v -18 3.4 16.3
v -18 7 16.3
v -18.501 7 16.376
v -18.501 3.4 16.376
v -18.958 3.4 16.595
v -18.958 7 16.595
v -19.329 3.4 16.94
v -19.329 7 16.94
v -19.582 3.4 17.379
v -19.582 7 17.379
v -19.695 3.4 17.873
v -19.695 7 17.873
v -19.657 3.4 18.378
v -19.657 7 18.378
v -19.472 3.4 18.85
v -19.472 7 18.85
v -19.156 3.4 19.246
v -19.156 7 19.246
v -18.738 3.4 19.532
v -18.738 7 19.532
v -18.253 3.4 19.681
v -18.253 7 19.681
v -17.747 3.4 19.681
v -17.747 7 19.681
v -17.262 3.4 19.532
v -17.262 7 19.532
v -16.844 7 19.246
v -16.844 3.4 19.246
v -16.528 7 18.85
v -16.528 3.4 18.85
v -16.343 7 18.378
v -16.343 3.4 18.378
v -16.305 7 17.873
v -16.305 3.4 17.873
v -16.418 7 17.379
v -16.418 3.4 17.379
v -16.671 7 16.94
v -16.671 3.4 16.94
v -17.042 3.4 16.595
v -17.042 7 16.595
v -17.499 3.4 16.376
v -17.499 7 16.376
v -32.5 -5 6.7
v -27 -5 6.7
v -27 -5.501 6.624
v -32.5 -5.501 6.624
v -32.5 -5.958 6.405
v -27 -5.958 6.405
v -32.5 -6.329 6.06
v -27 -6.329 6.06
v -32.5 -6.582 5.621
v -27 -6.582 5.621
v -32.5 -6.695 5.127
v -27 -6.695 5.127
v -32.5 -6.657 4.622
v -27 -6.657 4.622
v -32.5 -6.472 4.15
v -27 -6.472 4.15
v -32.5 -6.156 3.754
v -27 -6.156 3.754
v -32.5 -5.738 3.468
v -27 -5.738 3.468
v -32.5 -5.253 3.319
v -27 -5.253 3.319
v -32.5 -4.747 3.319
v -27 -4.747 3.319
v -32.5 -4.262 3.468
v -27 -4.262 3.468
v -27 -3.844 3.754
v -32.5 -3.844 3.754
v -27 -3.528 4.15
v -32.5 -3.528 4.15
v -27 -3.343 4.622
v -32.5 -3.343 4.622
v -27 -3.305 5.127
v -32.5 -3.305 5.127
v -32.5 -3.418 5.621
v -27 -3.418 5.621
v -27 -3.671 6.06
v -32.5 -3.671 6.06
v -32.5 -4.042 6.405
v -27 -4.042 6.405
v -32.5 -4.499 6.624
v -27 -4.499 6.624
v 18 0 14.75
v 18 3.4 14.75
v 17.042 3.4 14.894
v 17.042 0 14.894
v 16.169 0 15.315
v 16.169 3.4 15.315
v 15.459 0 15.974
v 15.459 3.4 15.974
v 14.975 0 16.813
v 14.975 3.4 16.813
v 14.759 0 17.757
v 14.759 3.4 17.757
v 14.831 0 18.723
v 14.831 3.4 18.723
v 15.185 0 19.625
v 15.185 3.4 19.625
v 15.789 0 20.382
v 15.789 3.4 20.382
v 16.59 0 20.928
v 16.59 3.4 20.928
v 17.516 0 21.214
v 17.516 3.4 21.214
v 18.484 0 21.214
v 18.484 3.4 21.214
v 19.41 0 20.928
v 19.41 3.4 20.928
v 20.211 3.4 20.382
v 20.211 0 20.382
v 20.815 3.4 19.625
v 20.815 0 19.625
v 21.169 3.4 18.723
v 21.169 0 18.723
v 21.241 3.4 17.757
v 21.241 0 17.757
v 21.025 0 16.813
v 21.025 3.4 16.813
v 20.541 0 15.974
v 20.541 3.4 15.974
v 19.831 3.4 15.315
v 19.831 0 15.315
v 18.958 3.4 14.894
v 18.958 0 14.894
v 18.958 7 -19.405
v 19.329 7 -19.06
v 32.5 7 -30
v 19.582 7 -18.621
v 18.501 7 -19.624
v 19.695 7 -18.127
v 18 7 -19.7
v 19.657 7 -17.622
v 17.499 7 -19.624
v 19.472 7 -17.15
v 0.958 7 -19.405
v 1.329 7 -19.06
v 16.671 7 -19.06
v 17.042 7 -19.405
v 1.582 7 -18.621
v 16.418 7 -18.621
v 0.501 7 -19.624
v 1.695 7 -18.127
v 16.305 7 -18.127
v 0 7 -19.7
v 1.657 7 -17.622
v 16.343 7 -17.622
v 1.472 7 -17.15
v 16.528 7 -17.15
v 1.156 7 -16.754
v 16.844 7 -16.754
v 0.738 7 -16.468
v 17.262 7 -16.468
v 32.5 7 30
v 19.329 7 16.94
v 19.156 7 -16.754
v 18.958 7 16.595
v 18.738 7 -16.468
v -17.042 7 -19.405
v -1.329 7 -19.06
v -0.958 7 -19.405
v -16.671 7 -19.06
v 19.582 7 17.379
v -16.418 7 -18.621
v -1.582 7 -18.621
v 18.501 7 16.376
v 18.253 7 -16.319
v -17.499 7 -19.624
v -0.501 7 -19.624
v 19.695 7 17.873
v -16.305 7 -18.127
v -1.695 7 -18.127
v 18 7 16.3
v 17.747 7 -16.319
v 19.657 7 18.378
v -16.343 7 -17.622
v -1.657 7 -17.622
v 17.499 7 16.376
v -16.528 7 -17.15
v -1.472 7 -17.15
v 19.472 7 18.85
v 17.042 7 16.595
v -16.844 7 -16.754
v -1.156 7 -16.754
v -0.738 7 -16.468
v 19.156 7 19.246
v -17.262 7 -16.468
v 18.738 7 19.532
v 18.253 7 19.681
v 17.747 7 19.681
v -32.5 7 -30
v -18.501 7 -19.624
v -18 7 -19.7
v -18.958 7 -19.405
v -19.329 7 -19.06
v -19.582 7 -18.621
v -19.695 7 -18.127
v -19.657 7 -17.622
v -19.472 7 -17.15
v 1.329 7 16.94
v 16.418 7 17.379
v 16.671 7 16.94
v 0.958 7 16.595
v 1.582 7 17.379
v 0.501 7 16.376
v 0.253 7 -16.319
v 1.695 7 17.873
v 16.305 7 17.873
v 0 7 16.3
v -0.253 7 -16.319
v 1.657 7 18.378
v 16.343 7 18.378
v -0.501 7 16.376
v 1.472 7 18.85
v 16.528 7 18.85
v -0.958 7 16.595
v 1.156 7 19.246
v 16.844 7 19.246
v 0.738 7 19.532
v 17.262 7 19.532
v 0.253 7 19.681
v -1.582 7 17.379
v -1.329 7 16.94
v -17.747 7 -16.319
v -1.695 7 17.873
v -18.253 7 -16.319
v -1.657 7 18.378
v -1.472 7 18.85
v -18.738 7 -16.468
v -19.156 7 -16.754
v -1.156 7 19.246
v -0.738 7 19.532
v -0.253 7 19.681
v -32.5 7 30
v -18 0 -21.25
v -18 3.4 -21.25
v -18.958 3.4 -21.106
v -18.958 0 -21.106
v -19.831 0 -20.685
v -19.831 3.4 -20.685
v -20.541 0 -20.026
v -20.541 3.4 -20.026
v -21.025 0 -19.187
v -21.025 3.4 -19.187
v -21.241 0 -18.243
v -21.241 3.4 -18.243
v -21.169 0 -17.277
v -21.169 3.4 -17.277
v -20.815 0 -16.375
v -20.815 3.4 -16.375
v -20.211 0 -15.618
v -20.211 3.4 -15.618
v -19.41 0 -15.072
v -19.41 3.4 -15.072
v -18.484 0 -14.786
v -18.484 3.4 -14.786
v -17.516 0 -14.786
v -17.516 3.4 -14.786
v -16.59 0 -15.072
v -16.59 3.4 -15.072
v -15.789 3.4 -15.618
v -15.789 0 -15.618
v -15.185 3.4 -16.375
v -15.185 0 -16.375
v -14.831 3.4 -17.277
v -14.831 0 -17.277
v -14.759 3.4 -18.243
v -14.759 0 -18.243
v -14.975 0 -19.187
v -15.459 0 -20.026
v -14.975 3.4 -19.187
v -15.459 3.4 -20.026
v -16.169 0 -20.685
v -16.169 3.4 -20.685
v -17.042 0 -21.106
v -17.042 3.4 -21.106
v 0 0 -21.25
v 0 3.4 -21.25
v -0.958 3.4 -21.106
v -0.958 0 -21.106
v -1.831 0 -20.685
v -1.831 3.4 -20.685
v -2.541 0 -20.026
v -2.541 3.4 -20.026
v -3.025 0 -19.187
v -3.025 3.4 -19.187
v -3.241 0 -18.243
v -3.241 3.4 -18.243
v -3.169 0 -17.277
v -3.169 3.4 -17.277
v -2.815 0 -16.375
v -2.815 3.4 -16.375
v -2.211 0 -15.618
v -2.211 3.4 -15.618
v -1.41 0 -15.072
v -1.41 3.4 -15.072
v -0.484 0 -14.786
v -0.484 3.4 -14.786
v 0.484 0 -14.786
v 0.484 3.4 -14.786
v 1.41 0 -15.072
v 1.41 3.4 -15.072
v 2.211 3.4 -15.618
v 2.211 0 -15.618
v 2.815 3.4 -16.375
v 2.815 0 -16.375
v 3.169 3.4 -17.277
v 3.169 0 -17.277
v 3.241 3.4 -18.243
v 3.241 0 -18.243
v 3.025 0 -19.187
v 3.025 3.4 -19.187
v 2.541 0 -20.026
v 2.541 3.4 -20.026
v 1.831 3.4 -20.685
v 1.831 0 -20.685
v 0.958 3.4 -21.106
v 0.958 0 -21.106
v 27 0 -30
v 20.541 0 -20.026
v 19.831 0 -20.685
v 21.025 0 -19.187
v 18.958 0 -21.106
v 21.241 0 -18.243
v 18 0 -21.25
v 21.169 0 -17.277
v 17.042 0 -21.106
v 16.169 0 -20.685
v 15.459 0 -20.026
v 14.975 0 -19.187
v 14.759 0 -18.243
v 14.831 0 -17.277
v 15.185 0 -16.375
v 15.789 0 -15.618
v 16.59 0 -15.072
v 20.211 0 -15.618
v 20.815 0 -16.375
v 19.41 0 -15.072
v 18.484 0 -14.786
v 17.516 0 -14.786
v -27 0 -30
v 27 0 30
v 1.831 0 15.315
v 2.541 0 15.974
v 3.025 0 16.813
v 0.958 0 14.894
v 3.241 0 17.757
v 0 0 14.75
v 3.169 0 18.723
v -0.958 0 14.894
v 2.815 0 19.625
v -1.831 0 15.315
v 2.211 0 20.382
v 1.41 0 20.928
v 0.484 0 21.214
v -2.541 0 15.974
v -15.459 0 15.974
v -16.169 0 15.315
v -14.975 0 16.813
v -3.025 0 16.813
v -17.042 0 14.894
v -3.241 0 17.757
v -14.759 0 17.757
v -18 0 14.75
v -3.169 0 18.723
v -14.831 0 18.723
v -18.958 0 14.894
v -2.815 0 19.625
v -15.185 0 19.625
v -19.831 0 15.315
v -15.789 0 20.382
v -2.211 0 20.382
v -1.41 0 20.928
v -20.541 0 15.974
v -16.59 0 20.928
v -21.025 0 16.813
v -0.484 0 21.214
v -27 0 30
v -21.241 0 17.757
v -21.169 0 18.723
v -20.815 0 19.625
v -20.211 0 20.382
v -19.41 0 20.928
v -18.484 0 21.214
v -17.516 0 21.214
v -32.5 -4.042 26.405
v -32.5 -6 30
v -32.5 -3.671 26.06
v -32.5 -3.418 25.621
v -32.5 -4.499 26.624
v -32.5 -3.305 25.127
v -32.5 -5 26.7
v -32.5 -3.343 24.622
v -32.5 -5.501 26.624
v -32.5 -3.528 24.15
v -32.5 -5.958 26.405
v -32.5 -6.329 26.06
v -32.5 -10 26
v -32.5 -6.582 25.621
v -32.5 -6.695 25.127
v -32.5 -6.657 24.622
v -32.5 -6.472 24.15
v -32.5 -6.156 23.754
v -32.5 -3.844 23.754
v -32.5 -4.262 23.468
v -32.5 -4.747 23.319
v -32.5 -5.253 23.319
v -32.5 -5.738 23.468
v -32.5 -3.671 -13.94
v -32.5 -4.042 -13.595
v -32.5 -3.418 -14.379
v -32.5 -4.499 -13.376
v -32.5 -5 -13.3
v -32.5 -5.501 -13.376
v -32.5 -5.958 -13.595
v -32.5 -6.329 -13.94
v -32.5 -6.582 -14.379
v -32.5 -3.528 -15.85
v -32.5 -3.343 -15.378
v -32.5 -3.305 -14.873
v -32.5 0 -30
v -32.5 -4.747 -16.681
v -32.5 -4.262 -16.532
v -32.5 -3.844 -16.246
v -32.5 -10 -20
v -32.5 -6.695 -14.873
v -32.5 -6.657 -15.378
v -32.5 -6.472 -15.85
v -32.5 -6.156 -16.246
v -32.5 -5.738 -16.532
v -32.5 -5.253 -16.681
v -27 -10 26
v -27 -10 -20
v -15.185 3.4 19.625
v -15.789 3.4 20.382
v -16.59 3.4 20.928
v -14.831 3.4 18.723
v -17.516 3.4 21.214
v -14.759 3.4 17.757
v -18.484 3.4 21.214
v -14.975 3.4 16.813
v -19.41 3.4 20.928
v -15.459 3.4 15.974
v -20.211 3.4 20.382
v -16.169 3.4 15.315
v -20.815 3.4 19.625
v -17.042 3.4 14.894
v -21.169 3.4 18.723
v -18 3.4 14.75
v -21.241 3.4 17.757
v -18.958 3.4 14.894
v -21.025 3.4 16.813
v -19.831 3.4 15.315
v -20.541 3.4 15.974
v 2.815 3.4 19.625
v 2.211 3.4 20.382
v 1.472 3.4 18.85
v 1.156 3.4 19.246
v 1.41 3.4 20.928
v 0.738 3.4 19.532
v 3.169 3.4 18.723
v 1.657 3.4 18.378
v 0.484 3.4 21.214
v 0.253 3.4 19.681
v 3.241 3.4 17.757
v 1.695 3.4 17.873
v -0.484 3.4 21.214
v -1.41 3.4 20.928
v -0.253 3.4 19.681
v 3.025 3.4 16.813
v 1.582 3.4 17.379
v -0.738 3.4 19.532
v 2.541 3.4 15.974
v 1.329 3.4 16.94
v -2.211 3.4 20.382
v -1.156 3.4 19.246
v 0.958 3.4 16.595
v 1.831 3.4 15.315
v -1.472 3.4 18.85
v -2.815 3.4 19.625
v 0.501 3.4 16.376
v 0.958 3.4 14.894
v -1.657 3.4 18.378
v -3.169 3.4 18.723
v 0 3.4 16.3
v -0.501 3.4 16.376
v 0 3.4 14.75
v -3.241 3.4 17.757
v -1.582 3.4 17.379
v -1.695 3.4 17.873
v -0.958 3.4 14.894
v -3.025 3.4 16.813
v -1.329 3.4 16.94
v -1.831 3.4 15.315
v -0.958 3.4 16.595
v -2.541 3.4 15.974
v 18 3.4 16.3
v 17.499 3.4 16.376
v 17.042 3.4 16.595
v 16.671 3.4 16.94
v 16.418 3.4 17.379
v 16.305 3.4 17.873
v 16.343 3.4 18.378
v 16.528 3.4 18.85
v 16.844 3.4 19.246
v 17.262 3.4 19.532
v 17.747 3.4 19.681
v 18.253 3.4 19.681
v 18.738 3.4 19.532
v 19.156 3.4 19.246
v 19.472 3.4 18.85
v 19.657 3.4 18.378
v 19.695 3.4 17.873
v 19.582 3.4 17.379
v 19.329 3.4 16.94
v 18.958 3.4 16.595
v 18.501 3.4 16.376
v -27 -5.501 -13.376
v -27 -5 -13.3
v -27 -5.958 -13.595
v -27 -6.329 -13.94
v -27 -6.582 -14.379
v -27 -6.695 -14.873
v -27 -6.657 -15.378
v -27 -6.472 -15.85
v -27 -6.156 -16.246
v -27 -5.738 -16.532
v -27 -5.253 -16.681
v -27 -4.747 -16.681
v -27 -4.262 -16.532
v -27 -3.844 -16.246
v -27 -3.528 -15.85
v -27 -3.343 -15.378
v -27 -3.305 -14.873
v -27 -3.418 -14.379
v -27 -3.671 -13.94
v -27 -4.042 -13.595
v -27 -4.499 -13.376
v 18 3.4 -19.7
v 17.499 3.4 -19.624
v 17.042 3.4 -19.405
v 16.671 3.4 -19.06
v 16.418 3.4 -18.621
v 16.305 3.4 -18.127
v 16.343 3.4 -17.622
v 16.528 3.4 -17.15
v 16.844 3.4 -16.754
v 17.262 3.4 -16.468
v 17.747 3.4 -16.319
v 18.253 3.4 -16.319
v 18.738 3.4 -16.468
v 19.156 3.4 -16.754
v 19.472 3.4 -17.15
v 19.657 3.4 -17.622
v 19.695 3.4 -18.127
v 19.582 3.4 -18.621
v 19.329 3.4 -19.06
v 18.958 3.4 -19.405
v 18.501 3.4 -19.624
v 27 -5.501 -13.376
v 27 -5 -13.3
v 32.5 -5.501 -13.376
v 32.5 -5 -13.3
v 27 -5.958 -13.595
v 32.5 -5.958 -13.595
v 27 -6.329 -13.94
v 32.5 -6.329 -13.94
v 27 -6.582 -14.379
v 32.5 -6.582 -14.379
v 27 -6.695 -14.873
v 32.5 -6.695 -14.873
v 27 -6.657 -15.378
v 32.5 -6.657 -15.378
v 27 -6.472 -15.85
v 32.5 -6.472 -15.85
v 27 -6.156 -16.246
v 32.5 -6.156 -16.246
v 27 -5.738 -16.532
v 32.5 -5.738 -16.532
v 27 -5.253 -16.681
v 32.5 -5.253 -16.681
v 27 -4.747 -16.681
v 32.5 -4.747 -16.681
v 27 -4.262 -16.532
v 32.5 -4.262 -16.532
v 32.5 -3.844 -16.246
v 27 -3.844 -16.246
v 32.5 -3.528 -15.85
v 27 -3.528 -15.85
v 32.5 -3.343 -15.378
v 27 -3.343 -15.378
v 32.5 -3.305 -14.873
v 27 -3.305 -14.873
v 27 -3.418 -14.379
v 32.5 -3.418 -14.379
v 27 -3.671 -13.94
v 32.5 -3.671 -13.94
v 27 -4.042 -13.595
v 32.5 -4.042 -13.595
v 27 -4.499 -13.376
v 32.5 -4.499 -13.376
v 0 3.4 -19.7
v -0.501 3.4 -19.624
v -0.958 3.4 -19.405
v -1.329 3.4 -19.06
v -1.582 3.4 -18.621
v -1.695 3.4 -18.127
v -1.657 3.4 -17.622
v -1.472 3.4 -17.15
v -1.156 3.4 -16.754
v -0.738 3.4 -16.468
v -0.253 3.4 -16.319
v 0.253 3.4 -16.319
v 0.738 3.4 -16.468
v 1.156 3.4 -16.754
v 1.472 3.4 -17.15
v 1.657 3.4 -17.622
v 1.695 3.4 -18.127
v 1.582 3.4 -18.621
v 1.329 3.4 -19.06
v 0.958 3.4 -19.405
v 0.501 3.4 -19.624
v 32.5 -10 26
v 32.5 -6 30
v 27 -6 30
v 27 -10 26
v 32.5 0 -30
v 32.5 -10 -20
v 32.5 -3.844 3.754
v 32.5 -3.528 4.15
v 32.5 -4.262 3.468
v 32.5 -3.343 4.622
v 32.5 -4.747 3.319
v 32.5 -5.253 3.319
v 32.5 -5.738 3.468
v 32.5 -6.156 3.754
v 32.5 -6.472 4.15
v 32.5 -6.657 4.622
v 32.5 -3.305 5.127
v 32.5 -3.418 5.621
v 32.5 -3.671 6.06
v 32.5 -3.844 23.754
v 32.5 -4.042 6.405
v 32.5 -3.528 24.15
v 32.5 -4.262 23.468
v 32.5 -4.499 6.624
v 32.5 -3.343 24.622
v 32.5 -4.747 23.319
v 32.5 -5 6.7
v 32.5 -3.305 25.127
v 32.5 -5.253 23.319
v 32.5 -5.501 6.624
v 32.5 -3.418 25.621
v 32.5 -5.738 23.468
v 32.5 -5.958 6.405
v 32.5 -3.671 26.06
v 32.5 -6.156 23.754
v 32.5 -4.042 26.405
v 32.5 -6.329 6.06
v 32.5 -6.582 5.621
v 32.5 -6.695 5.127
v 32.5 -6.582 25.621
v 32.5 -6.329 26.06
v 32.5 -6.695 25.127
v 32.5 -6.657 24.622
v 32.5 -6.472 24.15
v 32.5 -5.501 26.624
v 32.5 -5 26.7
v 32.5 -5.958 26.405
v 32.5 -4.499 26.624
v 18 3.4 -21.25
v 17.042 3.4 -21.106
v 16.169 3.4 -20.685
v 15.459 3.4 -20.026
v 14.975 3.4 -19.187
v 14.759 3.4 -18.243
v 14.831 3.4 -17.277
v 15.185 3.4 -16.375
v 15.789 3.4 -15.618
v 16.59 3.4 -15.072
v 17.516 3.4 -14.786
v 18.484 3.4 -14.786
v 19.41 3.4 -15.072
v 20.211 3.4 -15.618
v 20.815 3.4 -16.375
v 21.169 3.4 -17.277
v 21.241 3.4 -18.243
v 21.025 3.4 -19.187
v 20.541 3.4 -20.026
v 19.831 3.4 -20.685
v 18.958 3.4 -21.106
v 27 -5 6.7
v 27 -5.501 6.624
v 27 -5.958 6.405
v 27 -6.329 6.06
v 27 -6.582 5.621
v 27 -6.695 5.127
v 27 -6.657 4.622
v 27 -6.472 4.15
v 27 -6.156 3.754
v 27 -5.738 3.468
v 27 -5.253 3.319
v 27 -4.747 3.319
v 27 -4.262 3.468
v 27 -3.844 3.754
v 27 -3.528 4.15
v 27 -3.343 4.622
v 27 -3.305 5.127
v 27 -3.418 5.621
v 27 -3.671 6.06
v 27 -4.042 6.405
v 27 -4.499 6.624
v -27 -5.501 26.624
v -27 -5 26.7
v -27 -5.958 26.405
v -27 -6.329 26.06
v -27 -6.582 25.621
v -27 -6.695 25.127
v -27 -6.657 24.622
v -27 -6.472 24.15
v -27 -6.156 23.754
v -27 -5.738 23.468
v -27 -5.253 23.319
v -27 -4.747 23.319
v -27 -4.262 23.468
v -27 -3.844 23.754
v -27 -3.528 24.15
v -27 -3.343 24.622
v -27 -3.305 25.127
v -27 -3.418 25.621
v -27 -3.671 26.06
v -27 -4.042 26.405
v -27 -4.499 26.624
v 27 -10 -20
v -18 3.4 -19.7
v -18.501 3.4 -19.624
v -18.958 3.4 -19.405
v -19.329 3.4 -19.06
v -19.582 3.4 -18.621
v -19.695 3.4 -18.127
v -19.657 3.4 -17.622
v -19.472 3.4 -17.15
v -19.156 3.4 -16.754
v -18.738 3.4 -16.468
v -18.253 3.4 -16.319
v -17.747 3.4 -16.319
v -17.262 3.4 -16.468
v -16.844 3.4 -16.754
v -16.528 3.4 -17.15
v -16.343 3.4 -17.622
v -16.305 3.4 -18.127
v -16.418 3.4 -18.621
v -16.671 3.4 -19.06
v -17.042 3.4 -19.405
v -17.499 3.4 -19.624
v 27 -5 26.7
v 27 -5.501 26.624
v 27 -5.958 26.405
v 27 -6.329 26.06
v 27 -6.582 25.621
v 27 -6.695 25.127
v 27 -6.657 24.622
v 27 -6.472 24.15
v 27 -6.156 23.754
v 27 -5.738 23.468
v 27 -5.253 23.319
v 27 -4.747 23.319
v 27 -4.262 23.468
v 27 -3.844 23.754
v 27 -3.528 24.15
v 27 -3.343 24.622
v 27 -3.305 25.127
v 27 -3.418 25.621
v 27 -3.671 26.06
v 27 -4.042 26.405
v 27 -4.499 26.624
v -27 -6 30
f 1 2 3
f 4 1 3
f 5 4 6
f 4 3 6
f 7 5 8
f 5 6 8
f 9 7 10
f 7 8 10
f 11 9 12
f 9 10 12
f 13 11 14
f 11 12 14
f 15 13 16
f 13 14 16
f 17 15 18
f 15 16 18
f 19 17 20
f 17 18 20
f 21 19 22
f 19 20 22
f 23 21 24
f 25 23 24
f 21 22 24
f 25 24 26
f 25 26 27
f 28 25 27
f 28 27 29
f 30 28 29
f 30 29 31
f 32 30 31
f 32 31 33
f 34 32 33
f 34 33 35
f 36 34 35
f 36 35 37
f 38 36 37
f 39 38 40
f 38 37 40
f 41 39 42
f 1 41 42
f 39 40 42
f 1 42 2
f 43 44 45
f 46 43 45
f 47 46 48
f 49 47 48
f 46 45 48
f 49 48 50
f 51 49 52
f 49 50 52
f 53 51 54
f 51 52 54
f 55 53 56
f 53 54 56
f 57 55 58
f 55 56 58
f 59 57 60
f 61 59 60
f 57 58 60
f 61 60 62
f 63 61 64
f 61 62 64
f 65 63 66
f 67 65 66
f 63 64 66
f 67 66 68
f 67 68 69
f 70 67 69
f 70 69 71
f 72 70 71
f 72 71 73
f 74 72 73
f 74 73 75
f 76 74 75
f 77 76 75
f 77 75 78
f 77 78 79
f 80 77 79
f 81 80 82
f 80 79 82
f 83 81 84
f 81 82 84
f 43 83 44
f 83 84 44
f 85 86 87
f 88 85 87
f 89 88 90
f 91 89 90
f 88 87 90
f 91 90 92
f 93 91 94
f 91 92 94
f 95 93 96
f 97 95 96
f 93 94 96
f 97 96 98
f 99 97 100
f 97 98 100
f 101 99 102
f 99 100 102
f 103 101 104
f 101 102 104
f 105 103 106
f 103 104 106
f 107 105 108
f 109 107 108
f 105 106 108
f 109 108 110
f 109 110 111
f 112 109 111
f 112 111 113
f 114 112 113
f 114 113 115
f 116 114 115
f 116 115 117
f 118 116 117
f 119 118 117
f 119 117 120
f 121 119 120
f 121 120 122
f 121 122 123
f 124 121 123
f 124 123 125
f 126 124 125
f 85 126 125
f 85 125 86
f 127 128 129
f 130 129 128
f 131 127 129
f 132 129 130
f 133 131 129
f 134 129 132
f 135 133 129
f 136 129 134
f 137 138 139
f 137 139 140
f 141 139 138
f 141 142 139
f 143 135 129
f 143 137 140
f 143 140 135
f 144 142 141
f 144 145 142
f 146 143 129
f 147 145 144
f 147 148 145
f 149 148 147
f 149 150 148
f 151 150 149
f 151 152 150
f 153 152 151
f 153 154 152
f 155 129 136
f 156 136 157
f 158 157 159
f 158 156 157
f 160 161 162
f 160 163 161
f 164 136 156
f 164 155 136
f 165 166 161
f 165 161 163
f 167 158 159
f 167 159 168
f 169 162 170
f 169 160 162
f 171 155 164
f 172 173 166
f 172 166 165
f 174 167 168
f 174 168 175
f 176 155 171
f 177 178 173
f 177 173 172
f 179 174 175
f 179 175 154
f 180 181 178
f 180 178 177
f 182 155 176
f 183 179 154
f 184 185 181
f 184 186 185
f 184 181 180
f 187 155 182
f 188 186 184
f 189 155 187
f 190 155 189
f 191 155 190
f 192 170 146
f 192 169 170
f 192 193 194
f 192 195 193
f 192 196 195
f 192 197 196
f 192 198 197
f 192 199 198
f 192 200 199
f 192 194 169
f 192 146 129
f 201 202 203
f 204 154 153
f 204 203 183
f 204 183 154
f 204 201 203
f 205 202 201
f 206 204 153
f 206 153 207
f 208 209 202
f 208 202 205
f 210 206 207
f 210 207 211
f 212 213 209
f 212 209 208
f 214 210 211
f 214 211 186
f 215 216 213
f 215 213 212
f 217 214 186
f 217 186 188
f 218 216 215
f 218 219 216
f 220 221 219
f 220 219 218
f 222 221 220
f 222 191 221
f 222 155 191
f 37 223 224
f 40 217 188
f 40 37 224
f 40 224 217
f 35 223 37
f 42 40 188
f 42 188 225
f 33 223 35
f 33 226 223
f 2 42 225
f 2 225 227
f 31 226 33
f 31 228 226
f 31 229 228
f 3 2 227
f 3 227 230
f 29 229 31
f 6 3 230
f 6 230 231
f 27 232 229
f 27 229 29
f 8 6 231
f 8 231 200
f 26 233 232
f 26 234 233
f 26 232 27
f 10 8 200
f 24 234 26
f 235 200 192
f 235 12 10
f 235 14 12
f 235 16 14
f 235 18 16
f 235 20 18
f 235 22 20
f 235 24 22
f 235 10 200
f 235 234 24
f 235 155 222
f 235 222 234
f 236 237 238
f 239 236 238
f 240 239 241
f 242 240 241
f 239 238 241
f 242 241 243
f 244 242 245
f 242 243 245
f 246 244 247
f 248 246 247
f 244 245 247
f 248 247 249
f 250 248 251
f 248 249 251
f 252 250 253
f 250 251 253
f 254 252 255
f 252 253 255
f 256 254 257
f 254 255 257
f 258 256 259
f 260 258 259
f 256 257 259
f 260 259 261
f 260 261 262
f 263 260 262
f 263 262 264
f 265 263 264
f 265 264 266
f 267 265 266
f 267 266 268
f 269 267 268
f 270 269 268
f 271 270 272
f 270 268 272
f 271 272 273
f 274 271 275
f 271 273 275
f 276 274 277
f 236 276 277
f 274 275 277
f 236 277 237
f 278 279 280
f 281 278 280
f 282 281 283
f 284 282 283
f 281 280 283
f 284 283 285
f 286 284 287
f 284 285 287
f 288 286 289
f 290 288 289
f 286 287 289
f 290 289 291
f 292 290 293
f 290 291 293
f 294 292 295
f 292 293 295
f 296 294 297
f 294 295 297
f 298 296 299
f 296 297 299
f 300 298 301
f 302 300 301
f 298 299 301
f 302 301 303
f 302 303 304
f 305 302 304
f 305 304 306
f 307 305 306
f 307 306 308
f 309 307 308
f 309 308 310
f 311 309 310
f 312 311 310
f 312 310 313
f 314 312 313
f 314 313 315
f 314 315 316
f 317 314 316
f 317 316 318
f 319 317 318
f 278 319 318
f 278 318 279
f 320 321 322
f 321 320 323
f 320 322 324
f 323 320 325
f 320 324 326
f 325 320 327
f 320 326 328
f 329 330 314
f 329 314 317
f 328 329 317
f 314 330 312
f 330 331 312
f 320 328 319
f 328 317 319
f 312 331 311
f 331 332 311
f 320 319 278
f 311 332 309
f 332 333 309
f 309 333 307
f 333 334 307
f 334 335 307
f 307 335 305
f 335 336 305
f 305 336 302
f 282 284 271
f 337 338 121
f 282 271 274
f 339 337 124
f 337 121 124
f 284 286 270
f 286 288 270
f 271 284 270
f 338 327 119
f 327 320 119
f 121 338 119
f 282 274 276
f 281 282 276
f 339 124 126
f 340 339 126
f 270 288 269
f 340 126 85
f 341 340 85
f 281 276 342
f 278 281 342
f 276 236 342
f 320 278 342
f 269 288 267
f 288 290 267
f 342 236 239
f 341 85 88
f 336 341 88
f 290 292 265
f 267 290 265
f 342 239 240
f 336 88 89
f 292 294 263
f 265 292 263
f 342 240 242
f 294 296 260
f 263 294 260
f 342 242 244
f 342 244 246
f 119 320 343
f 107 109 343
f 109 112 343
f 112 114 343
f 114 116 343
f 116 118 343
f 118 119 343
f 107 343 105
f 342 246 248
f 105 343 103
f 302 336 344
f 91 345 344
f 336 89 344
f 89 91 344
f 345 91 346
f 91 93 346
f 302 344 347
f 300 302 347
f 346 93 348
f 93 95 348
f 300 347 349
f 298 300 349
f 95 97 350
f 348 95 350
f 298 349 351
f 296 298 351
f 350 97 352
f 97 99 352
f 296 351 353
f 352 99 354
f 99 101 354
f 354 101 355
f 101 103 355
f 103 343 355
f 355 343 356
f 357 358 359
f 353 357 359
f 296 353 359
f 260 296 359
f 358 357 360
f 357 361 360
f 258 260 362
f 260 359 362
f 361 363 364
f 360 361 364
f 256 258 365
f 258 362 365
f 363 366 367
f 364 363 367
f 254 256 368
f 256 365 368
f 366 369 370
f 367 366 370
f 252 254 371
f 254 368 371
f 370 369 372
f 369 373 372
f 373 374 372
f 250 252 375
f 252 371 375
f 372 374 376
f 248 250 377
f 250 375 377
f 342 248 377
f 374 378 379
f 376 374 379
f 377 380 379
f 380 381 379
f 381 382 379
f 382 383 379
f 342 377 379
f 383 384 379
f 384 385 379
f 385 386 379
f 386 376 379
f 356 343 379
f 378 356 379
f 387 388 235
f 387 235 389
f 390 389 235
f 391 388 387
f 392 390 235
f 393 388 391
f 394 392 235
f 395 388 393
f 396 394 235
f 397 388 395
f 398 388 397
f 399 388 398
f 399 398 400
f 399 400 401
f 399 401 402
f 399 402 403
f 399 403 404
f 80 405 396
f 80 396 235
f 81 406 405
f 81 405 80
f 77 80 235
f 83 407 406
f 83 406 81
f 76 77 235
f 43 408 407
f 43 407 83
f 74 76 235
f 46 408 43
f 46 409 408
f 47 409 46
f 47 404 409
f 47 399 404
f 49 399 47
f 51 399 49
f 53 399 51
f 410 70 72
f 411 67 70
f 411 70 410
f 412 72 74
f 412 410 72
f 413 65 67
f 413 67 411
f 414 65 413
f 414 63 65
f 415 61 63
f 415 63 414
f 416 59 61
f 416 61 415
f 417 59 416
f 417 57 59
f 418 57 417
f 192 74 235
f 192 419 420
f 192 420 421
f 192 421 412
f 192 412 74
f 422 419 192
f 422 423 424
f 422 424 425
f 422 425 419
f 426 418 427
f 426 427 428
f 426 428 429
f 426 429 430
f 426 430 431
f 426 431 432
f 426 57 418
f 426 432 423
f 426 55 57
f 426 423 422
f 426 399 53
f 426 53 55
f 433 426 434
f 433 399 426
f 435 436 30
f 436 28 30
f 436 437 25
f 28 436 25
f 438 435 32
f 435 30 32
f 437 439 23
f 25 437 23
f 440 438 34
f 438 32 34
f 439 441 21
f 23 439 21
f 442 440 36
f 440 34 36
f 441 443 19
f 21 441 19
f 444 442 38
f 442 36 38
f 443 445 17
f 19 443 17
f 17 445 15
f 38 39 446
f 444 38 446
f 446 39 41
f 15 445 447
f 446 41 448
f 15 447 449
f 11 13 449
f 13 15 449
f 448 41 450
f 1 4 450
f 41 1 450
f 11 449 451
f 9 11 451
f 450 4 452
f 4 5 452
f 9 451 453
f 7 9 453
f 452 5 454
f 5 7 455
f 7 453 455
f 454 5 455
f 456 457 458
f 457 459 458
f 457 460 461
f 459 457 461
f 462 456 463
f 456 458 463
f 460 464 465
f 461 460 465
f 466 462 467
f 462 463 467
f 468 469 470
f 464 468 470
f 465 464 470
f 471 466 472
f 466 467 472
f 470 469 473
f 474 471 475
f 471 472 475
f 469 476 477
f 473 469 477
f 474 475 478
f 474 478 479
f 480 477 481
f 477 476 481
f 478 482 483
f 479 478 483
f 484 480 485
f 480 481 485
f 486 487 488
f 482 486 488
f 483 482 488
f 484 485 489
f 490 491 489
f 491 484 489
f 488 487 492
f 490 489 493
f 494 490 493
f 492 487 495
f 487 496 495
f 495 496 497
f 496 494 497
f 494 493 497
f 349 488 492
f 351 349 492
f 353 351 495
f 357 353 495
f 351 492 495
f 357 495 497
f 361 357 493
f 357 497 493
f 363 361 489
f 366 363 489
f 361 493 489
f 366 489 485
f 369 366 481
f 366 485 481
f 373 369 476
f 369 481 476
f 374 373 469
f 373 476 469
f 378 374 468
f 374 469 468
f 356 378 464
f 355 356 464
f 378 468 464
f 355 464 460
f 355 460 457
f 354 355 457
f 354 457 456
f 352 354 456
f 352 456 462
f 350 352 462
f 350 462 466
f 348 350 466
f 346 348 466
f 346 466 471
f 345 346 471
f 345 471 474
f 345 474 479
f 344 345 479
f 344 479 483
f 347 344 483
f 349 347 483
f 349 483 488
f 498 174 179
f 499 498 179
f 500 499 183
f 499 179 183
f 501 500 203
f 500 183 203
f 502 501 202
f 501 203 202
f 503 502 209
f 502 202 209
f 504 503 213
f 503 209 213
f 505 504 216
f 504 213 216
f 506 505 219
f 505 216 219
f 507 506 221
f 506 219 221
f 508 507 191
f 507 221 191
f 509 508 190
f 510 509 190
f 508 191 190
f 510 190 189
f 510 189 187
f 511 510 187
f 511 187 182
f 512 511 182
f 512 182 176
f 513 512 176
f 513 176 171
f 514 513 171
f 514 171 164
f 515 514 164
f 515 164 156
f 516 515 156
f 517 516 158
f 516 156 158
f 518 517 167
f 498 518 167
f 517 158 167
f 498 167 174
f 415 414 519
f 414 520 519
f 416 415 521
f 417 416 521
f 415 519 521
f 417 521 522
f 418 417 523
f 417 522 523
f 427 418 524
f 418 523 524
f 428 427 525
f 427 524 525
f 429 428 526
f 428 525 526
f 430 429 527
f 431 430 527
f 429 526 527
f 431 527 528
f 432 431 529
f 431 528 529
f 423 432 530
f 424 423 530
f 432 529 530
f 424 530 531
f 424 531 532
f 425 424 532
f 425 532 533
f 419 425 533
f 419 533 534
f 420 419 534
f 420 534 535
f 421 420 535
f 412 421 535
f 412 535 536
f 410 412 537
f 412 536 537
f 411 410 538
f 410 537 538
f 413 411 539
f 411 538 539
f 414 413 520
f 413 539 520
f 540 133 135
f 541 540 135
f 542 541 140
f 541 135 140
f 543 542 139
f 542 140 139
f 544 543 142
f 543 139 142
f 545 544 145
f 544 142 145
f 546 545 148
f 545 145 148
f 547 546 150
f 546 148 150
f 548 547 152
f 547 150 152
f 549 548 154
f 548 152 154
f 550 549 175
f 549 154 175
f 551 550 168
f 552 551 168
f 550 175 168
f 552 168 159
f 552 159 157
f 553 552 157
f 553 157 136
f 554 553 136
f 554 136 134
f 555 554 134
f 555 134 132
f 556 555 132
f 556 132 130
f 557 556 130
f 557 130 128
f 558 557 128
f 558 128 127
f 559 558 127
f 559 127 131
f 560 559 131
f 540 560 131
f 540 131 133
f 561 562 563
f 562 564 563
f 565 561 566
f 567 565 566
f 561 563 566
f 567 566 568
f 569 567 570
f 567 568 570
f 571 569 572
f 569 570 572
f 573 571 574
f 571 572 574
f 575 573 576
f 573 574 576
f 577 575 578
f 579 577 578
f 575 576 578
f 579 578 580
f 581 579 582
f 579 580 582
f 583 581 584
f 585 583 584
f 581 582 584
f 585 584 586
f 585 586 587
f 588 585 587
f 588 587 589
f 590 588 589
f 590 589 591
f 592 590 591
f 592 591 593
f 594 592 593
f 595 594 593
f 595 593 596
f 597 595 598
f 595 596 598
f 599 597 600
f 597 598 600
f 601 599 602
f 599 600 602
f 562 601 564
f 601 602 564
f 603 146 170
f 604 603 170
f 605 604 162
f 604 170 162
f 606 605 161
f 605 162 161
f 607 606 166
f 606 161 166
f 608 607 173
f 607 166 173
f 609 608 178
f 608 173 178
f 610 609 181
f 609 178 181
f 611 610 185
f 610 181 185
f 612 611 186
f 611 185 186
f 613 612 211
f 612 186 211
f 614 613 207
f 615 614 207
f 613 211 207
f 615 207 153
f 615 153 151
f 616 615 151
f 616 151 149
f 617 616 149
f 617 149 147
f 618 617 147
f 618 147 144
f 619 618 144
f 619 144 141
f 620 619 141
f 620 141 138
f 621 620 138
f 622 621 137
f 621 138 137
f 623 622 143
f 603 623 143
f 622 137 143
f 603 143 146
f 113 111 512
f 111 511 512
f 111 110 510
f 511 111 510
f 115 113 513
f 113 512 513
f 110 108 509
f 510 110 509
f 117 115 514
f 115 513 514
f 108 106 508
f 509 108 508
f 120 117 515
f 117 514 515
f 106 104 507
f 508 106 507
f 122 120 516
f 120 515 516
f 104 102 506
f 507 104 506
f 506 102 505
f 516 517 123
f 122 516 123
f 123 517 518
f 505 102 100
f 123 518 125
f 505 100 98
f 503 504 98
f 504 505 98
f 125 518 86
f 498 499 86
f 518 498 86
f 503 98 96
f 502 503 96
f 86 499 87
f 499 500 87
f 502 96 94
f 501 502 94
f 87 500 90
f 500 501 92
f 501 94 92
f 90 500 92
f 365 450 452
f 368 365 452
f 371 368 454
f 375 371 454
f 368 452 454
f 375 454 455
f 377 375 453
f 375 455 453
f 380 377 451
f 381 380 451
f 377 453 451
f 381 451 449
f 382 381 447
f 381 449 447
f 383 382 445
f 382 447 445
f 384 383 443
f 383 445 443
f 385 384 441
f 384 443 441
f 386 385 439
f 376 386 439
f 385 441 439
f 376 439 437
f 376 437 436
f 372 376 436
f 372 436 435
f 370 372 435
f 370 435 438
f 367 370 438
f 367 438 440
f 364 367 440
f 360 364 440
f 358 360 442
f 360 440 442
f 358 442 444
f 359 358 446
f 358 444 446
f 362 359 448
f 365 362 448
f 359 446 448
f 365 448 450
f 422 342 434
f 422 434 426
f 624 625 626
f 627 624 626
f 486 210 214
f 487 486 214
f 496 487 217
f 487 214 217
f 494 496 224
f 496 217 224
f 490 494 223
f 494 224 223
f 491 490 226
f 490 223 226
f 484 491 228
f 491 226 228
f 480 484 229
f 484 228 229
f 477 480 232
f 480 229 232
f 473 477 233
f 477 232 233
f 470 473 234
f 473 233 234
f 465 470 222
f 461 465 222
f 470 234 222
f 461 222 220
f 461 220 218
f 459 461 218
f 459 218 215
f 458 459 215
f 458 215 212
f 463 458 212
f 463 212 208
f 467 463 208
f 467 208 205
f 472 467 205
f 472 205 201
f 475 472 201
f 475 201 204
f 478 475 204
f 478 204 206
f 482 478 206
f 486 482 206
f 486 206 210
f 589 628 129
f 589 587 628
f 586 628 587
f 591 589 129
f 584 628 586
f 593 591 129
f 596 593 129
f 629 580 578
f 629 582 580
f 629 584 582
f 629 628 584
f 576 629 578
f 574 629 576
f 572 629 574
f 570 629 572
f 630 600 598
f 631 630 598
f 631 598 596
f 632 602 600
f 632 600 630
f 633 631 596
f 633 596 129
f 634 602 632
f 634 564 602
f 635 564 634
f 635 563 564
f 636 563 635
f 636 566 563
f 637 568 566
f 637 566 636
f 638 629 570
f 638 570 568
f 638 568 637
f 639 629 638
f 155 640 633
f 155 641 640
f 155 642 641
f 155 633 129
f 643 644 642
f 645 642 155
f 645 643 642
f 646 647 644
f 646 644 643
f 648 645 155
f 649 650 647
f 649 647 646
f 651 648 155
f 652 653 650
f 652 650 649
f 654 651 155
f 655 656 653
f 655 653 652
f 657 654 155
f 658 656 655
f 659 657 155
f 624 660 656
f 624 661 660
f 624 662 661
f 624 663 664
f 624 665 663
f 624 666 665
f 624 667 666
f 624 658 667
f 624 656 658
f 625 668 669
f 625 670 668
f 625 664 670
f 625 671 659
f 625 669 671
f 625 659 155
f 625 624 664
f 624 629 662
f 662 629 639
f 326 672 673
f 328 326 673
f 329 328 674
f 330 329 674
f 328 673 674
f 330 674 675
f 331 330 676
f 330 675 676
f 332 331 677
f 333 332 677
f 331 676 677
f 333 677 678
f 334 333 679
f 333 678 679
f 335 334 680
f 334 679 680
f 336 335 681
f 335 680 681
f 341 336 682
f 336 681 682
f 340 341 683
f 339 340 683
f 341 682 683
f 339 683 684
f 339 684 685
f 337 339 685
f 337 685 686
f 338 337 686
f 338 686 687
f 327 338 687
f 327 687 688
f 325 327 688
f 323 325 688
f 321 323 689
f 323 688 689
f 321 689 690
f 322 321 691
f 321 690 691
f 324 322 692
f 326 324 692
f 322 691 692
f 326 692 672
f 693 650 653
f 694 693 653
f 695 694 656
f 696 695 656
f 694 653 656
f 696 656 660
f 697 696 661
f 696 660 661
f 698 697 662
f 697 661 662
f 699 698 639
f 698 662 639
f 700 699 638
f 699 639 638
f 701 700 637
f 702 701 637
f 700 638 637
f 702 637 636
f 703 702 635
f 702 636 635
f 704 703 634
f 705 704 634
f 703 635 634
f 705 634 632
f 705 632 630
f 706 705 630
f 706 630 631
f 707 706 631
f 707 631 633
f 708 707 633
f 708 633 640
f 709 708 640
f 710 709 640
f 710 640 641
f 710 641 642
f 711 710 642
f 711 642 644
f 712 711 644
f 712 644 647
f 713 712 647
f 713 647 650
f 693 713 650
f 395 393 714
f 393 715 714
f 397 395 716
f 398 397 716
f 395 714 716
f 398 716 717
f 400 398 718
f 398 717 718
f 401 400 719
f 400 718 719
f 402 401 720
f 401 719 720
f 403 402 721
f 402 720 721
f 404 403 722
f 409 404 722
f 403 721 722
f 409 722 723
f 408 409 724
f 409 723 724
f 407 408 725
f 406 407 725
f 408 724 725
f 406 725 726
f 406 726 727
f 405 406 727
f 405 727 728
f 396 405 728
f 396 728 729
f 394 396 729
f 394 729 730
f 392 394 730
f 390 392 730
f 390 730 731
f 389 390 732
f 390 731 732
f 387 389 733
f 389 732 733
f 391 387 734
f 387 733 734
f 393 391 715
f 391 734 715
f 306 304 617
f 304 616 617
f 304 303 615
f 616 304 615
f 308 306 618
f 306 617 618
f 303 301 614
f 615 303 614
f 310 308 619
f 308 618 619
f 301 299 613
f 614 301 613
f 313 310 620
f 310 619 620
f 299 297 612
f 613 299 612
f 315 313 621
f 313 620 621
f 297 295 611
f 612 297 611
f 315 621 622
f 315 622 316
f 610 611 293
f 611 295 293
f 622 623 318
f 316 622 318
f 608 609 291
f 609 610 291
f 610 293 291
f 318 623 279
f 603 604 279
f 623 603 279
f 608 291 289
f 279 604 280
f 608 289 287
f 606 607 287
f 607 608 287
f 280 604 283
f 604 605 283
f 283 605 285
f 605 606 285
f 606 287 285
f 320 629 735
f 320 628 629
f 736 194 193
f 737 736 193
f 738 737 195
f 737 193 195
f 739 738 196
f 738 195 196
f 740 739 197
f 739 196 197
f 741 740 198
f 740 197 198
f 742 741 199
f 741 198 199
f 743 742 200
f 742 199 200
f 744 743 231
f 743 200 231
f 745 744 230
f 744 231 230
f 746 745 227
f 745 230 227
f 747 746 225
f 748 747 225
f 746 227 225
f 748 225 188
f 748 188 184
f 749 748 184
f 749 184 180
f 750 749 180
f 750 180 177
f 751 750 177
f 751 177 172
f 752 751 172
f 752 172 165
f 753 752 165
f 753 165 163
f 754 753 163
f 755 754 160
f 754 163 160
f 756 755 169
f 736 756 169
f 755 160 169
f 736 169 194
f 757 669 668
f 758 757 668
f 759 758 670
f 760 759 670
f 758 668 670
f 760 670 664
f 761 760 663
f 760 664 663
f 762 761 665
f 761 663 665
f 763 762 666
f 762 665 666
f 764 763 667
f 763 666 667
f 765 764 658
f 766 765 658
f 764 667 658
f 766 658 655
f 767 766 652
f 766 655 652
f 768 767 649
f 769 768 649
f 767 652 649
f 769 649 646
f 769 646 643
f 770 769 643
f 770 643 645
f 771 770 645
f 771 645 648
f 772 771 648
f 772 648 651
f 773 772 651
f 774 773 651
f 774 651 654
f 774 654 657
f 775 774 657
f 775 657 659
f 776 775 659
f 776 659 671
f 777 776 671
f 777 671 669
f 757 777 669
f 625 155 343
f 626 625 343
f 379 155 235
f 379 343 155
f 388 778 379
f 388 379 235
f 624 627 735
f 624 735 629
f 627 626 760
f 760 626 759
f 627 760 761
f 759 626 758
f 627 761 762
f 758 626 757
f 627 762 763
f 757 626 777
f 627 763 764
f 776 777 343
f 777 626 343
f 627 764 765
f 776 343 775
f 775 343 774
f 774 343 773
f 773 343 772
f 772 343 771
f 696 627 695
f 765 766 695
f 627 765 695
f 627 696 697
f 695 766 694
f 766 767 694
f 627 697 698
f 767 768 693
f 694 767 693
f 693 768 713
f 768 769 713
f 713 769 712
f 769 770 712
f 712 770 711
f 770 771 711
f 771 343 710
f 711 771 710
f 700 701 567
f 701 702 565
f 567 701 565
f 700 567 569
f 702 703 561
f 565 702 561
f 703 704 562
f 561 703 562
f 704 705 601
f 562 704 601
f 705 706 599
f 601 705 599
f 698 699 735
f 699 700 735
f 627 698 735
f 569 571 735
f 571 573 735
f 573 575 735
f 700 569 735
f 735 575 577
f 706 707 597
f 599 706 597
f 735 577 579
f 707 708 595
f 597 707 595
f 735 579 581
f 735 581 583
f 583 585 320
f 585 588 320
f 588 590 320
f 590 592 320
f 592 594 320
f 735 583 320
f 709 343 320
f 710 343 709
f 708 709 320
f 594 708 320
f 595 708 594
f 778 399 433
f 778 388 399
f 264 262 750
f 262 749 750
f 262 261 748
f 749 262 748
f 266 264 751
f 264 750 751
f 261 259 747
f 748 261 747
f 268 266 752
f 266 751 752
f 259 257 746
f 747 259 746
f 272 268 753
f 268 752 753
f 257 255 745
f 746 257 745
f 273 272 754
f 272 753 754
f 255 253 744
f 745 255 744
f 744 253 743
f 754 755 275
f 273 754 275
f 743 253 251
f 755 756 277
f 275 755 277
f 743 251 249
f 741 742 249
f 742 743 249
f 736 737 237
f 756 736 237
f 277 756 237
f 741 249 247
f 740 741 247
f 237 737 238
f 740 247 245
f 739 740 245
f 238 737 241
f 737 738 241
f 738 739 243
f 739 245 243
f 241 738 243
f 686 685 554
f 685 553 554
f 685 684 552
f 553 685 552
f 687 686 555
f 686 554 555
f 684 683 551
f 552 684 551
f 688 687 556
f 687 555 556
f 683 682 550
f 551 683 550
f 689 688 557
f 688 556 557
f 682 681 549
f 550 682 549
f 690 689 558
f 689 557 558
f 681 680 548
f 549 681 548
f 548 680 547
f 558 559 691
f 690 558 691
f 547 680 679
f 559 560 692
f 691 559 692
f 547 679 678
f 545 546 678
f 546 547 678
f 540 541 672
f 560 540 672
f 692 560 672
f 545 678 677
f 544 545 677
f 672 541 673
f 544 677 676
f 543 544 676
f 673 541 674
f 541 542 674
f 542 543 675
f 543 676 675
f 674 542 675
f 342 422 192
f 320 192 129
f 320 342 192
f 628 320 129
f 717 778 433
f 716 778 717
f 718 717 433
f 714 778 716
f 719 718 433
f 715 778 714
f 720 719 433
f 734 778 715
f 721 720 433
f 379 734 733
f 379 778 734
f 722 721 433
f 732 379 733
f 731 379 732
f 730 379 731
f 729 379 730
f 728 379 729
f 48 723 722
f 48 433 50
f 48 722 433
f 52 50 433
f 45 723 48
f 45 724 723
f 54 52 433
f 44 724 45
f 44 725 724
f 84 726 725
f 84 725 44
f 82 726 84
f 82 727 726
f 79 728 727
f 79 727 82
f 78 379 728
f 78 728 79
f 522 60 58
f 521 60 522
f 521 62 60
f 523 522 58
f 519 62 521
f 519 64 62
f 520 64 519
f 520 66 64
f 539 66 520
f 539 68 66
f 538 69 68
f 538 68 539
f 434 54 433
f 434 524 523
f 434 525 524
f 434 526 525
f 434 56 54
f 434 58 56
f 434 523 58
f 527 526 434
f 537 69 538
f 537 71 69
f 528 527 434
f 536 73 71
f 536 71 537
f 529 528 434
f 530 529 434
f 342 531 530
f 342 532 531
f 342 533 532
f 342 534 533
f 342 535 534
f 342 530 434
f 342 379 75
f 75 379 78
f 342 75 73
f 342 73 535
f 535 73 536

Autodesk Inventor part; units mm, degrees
ref_plane "YZ Plane" through (0, 0, 0) normal (1, 0, 0) x (0, 1, 0)
ref_plane "XZ Plane" through (0, 0, 0) normal (0, 1, 0) x (-1, 0, 0)
ref_plane "XY Plane" through (0, 0, 0) normal (0, 0, 1) x (1, 0, 0)
sketch "Skizze1" plane through (0, 0, 0) normal (0, 1, 0) x (-1, 0, 0)
  line L0 (-32.5, 30) -> (32.5, 30)
  line L1 (32.5, 30) -> (32.5, -30)
  line L2 (32.5, -30) -> (-32.5, -30)
  line L3 (-32.5, -30) -> (-32.5, 30)
  line L4 (-32.5, 30) -> (32.5, -30) construction
  line L5 (32.5, 30) -> (-32.5, -30) construction
  point P0 (0, 0)
  dimension "d0" = 65
  dimension "d1" = 60
extrude "Extrusion1" add sketch "Skizze1" along normal blind 7
sketch "Skizze2" plane through (0, 7, 0) normal (0, 1, 0) x (1, 0, 0)
  line L0 (24.5, -20) -> (-24.5, -20)
  line L1 (-24.5, -20) -> (-24.5, 20)
  line L2 (-24.5, 20) -> (24.5, 20)
  line L3 (24.5, 20) -> (24.5, -20)
  line L4 (24.5, -20) -> (-24.5, 20) construction
  line L5 (-24.5, -20) -> (24.5, 20) construction
  line L6 (29.8936, 0) -> (-30.3656, 0) construction
  point P0 (0, 0)
  point P1 (0, 0)
  point P2 (-24.5, 0)
  point P3 (24.5, 0)
  dimension "d4" = 49
  dimension "d5" = 40
hole "Bohrung1" [suppressed]
sketch "Skizze3" plane through (0, 0, 0) normal (0, -1, 0) x (1, 0, 0)
  line L0 (-18, -18) -> (18, -18)
  line L1 (18, -18) -> (18, 18)
  line L2 (18, 18) -> (-18, 18)
  line L3 (-18, 18) -> (-18, -18)
  line L4 (-18, -18) -> (18, 18) construction
  line L5 (18, -18) -> (-18, 18) construction
  line L6 (0, -22.3415) -> (0, 25.3309) construction
  point P0 (0, 0)
  point P1 (0, 18)
  point P2 (0, -18)
  dimension "d13" = 36
  dimension "d14" = 36
hole "Bohrung2" at (0, 0, 18) at (0, 0, -18) at (-18, 0, 18) at (-18, 0, -18) at (18, 0, 18) at (18, 0, -18) direction (0, 1, 0) diameter 3.4 depth 8 tip angle 118 counterbore diameter 6.5 counterbore depth 3.4 clearance for "Inbusschraube ISO 4762" size "M3" standard "ISO"
sketch "Skizze4" plane through (0, 0, 0) normal (0, -1, 0) x (1, 0, 0)
  circle A0 centre (18, 18) radius 3.25 projected
  circle A1 centre (-18, 18) radius 3.25 projected
  circle A2 centre (0, 18) radius 3.25 projected
  circle A3 centre (0, -18) radius 3.25 projected
  circle A4 centre (-18, -18) radius 3.25 projected
  circle A5 centre (18, -18) radius 3.25 projected
  line L0 (32.5, 30) -> (-32.5, 30) projected
  line L1 (-32.5, 30) -> (-32.5, -30) projected
  line L2 (-32.5, -30) -> (32.5, -30) projected
  line L3 (32.5, -30) -> (32.5, 30) projected
  line L4 (-32.5, 30) -> (-27, 30)
  line L5 (-27, 30) -> (-27, -30)
  line L6 (-27, -30) -> (-32.5, -30)
  line L7 (-32.5, -30) -> (-32.5, 30)
  line L8 (32.5, -30) -> (-32.5, -30) projected
  line L9 (27, -30) -> (32.5, -30)
  line L10 (32.5, -30) -> (32.5, 30)
  line L11 (32.5, 30) -> (27, 30)
  line L12 (27, 30) -> (27, -30)
  point P0 (0, 0)
  dimension "d22" = 54
  dimension "d23" = 65
  dimension "d24" = 5.5
extrude "Extrusion2" add sketch "Skizze4" along normal blind 10 contours L3 L2 L12 L0 | L5 L2 L1 L0
sketch "Skizze5" plane through (-32.5, 7, -30) normal (-1, 0, 0) x (0, 0, 1)
  line L0 (0, -7) -> (60, -7) projected
  line L1 (0, -7) -> (0, -17) projected
  line L2 (60, -17) -> (0, -17) projected
  line L3 (60, -7) -> (60, -17) projected
  point P0 (30, -7)
  point P1 (35, -12)
  dimension "d27" = 5
  dimension "d41" = 35
  dimension "d42" = 60
hole "Bohrung3" at (-32.5, -5, 5) direction (1, 0, 0) diameter 3.4 end through all clearance for "Inbusschraube ISO 4762" size "M3" standard "ISO"
pattern_linear "Rechteckige Anordnung1" count 3 spacing 20 along (0, 0, -1) of "Bohrung3" first direction both ways yes
chamfer "Fase2" distance 10 angle 45 2 edges at (-29.75, -10, -30) (29.75, -10, -30)
chamfer "Fase3" distance 4 angle 45 2 edges at (-29.75, -10, 30) (29.75, -10, 30)
equation "\"d24\" = -0.5 * d22 + 0.5 * d23"
properties part number "complex_cube_plane" material "Aluminium 6061"
